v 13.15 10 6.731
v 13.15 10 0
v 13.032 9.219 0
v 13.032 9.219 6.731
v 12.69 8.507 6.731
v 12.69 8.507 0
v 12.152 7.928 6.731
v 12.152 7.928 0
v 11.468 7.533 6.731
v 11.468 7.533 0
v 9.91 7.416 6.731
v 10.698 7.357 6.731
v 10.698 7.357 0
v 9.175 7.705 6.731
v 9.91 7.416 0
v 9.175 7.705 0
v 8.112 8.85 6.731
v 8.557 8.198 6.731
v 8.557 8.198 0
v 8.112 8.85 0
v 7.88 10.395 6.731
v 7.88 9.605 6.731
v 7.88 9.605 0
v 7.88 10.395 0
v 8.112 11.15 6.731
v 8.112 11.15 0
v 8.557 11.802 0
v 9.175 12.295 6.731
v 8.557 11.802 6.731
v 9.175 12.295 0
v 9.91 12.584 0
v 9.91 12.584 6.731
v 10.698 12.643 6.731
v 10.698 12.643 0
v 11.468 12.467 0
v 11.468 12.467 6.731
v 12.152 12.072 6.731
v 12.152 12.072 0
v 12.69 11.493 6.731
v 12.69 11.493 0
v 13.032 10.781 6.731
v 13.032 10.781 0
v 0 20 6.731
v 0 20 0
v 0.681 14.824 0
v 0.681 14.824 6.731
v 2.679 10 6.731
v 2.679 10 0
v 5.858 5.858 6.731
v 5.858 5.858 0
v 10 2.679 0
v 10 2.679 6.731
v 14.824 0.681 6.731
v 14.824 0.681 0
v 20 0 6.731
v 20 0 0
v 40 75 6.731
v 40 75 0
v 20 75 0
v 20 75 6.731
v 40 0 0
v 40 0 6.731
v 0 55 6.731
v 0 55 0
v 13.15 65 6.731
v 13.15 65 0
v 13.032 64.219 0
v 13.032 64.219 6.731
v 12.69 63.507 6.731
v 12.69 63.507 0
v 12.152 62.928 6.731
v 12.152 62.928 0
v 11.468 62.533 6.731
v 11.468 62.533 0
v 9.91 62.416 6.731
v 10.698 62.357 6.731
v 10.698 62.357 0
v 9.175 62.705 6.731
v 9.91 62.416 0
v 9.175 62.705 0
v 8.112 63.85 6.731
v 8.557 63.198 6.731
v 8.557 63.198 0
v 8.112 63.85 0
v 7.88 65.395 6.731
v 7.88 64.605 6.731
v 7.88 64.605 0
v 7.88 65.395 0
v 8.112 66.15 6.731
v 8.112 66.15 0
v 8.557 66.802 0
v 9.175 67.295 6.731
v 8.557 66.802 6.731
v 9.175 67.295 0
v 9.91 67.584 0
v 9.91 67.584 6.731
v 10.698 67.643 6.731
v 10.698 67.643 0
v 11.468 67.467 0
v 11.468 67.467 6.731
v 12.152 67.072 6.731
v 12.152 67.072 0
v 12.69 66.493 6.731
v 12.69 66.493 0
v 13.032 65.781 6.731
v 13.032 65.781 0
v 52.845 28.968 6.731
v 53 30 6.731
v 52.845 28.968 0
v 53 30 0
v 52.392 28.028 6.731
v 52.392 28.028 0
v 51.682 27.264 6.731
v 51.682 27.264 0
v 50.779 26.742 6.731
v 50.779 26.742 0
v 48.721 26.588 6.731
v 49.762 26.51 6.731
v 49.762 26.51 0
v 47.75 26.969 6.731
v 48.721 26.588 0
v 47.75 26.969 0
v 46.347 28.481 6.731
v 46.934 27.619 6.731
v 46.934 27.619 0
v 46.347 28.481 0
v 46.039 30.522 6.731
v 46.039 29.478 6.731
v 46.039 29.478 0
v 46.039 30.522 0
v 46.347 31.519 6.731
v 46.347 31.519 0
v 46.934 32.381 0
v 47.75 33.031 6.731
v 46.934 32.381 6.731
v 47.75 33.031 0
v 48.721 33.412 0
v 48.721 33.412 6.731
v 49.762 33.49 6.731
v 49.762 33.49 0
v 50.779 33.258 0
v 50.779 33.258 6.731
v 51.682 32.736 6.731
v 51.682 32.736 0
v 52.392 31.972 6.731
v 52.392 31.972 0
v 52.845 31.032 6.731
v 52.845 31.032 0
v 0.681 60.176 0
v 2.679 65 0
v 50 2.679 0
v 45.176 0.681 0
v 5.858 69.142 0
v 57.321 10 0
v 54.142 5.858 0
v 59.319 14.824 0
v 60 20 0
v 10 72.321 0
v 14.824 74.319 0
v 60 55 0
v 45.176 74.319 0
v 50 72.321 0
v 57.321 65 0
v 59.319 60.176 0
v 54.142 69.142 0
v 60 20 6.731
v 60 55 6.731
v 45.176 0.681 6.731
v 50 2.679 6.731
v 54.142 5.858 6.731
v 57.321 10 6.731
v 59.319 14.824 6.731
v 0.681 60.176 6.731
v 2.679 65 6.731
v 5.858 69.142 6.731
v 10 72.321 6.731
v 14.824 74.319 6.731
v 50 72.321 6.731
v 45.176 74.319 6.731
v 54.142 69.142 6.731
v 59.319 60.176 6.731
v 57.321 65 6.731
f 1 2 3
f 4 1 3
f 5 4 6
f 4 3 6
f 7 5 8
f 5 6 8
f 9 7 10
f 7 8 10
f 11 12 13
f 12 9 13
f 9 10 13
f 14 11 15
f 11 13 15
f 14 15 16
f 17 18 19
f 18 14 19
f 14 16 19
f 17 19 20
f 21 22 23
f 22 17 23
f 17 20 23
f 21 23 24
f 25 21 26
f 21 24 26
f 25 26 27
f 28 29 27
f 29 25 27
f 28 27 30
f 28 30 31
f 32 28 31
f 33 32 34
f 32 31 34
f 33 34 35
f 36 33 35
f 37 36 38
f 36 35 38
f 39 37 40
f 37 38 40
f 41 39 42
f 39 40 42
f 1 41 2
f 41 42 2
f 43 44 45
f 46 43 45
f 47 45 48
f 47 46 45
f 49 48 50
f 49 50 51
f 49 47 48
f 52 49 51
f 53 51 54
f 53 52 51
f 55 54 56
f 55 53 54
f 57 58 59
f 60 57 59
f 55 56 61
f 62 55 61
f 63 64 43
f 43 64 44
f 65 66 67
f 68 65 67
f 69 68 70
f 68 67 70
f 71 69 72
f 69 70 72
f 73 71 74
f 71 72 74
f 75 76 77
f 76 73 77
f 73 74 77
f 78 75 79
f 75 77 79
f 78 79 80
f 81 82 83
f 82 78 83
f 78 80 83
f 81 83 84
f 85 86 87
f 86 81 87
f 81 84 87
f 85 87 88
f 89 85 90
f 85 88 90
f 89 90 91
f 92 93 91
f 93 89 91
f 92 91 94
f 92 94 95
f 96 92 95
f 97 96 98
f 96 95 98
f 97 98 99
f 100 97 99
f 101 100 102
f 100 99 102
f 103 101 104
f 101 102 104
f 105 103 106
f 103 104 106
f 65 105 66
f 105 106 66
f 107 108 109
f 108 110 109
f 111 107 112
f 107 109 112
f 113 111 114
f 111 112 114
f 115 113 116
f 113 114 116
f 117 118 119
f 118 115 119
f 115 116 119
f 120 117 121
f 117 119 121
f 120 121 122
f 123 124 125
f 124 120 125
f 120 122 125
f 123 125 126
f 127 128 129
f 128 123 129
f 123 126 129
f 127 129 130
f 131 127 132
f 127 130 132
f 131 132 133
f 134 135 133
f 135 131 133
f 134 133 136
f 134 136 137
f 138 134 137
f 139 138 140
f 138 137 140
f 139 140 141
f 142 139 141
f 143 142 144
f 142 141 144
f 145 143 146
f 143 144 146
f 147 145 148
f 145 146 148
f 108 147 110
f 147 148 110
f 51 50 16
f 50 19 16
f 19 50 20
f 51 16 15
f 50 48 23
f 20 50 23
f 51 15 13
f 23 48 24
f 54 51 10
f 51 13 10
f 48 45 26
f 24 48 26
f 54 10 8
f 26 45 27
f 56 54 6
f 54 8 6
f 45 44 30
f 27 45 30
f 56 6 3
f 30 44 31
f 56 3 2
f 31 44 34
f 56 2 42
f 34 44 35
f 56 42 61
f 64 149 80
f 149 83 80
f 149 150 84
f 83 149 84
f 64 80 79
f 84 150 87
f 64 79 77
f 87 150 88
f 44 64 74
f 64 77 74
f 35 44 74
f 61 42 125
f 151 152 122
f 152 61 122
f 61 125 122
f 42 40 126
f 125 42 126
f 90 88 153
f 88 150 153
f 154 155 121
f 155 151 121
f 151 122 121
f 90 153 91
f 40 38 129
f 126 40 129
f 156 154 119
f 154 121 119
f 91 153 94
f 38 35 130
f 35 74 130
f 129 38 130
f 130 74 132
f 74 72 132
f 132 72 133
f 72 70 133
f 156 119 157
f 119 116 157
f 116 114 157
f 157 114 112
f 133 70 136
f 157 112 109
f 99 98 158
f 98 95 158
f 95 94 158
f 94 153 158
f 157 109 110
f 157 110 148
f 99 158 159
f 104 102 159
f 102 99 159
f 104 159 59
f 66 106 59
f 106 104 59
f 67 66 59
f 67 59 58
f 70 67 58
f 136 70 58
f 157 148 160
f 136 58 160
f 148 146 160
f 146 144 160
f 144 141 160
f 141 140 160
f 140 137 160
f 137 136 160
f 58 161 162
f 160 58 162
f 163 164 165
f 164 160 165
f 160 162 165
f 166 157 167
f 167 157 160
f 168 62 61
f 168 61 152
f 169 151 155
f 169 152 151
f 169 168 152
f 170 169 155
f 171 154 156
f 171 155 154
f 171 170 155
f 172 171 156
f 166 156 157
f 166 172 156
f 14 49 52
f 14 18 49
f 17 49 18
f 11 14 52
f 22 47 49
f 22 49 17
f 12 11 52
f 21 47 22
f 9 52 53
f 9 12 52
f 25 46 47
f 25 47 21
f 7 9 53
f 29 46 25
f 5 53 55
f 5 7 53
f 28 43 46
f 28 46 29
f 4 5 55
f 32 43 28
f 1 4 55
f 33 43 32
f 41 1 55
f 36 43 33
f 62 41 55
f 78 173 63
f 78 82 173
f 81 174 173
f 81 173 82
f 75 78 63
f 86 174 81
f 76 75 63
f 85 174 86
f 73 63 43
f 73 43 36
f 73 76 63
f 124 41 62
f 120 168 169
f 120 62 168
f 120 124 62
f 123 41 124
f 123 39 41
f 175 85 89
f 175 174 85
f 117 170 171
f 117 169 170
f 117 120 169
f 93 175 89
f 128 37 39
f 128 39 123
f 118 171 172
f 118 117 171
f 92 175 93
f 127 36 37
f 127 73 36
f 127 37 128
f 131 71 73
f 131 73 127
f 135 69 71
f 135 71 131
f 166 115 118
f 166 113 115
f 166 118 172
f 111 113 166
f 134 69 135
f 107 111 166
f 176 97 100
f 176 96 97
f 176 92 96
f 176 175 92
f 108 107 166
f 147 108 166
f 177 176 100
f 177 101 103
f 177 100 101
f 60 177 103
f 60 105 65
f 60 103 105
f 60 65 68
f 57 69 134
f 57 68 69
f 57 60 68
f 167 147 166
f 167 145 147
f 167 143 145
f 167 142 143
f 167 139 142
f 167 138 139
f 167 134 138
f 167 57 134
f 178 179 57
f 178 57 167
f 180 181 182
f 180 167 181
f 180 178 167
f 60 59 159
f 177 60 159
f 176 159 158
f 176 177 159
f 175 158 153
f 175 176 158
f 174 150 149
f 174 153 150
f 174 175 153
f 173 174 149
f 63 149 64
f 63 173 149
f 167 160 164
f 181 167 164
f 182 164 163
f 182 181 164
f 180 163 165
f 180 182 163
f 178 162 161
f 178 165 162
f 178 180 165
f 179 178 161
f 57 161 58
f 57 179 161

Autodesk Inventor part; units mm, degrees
ref_plane "YZ Plane" through (0, 0, 0) normal (1, 0, 0) x (0, 1, 0)
ref_plane "XZ Plane" through (0, 0, 0) normal (0, 1, 0) x (-1, 0, 0)
ref_plane "XY Plane" through (0, 0, 0) normal (0, 0, 1) x (1, 0, 0)
sketch "Sketch1" plane through (0, 0, 0) normal (0, 0, 1) x (1, 0, 0)
  circle A0 centre (10.5, 65) radius 2.65
  circle A1 centre (10.5, 10) radius 2.65
  circle A2 centre (49.5, 30) radius 3.5
  line L0 (0, 0) -> (60, 0)
  line L1 (60, 0) -> (60, 75)
  line L2 (60, 75) -> (0, 75)
  line L3 (0, 75) -> (0, 0)
  dimension "d0" = 39
  dimension "d1" = 5.3
  dimension "d2" = 55
  dimension "d16" = 7
  dimension "d26" = 75
  dimension "d27" = 60
  dimension "d28" = 10
  dimension "d29" = 10.5
  dimension "d32" = 20
  dimension "d44" = 10.5
  dimension "d50" = 10
extrude "Extrusion1" add sketch "Sketch1" along normal blind 6.731
fillet "Fillet1" radius 20 4 edges at (0, 75, 3.3655) (60, 75, 3.3655) (0, 0, 3.3655) (60, 0, 3.3655)
equation "\"d29\" = d44"
equation "\"d30\" = THICKB"
equation "\"THICKA\" = 3.175"
equation "\"THICKB\" = 6.731"
equation "\"THICKC\" = 12.7"
equation "\"BALLDIA\" = 12"
equation "\"MAGDIA\" = 9.5"
equation "\"THICKPLY\" = 5"
properties part number "Carriage_Frame_Back"
